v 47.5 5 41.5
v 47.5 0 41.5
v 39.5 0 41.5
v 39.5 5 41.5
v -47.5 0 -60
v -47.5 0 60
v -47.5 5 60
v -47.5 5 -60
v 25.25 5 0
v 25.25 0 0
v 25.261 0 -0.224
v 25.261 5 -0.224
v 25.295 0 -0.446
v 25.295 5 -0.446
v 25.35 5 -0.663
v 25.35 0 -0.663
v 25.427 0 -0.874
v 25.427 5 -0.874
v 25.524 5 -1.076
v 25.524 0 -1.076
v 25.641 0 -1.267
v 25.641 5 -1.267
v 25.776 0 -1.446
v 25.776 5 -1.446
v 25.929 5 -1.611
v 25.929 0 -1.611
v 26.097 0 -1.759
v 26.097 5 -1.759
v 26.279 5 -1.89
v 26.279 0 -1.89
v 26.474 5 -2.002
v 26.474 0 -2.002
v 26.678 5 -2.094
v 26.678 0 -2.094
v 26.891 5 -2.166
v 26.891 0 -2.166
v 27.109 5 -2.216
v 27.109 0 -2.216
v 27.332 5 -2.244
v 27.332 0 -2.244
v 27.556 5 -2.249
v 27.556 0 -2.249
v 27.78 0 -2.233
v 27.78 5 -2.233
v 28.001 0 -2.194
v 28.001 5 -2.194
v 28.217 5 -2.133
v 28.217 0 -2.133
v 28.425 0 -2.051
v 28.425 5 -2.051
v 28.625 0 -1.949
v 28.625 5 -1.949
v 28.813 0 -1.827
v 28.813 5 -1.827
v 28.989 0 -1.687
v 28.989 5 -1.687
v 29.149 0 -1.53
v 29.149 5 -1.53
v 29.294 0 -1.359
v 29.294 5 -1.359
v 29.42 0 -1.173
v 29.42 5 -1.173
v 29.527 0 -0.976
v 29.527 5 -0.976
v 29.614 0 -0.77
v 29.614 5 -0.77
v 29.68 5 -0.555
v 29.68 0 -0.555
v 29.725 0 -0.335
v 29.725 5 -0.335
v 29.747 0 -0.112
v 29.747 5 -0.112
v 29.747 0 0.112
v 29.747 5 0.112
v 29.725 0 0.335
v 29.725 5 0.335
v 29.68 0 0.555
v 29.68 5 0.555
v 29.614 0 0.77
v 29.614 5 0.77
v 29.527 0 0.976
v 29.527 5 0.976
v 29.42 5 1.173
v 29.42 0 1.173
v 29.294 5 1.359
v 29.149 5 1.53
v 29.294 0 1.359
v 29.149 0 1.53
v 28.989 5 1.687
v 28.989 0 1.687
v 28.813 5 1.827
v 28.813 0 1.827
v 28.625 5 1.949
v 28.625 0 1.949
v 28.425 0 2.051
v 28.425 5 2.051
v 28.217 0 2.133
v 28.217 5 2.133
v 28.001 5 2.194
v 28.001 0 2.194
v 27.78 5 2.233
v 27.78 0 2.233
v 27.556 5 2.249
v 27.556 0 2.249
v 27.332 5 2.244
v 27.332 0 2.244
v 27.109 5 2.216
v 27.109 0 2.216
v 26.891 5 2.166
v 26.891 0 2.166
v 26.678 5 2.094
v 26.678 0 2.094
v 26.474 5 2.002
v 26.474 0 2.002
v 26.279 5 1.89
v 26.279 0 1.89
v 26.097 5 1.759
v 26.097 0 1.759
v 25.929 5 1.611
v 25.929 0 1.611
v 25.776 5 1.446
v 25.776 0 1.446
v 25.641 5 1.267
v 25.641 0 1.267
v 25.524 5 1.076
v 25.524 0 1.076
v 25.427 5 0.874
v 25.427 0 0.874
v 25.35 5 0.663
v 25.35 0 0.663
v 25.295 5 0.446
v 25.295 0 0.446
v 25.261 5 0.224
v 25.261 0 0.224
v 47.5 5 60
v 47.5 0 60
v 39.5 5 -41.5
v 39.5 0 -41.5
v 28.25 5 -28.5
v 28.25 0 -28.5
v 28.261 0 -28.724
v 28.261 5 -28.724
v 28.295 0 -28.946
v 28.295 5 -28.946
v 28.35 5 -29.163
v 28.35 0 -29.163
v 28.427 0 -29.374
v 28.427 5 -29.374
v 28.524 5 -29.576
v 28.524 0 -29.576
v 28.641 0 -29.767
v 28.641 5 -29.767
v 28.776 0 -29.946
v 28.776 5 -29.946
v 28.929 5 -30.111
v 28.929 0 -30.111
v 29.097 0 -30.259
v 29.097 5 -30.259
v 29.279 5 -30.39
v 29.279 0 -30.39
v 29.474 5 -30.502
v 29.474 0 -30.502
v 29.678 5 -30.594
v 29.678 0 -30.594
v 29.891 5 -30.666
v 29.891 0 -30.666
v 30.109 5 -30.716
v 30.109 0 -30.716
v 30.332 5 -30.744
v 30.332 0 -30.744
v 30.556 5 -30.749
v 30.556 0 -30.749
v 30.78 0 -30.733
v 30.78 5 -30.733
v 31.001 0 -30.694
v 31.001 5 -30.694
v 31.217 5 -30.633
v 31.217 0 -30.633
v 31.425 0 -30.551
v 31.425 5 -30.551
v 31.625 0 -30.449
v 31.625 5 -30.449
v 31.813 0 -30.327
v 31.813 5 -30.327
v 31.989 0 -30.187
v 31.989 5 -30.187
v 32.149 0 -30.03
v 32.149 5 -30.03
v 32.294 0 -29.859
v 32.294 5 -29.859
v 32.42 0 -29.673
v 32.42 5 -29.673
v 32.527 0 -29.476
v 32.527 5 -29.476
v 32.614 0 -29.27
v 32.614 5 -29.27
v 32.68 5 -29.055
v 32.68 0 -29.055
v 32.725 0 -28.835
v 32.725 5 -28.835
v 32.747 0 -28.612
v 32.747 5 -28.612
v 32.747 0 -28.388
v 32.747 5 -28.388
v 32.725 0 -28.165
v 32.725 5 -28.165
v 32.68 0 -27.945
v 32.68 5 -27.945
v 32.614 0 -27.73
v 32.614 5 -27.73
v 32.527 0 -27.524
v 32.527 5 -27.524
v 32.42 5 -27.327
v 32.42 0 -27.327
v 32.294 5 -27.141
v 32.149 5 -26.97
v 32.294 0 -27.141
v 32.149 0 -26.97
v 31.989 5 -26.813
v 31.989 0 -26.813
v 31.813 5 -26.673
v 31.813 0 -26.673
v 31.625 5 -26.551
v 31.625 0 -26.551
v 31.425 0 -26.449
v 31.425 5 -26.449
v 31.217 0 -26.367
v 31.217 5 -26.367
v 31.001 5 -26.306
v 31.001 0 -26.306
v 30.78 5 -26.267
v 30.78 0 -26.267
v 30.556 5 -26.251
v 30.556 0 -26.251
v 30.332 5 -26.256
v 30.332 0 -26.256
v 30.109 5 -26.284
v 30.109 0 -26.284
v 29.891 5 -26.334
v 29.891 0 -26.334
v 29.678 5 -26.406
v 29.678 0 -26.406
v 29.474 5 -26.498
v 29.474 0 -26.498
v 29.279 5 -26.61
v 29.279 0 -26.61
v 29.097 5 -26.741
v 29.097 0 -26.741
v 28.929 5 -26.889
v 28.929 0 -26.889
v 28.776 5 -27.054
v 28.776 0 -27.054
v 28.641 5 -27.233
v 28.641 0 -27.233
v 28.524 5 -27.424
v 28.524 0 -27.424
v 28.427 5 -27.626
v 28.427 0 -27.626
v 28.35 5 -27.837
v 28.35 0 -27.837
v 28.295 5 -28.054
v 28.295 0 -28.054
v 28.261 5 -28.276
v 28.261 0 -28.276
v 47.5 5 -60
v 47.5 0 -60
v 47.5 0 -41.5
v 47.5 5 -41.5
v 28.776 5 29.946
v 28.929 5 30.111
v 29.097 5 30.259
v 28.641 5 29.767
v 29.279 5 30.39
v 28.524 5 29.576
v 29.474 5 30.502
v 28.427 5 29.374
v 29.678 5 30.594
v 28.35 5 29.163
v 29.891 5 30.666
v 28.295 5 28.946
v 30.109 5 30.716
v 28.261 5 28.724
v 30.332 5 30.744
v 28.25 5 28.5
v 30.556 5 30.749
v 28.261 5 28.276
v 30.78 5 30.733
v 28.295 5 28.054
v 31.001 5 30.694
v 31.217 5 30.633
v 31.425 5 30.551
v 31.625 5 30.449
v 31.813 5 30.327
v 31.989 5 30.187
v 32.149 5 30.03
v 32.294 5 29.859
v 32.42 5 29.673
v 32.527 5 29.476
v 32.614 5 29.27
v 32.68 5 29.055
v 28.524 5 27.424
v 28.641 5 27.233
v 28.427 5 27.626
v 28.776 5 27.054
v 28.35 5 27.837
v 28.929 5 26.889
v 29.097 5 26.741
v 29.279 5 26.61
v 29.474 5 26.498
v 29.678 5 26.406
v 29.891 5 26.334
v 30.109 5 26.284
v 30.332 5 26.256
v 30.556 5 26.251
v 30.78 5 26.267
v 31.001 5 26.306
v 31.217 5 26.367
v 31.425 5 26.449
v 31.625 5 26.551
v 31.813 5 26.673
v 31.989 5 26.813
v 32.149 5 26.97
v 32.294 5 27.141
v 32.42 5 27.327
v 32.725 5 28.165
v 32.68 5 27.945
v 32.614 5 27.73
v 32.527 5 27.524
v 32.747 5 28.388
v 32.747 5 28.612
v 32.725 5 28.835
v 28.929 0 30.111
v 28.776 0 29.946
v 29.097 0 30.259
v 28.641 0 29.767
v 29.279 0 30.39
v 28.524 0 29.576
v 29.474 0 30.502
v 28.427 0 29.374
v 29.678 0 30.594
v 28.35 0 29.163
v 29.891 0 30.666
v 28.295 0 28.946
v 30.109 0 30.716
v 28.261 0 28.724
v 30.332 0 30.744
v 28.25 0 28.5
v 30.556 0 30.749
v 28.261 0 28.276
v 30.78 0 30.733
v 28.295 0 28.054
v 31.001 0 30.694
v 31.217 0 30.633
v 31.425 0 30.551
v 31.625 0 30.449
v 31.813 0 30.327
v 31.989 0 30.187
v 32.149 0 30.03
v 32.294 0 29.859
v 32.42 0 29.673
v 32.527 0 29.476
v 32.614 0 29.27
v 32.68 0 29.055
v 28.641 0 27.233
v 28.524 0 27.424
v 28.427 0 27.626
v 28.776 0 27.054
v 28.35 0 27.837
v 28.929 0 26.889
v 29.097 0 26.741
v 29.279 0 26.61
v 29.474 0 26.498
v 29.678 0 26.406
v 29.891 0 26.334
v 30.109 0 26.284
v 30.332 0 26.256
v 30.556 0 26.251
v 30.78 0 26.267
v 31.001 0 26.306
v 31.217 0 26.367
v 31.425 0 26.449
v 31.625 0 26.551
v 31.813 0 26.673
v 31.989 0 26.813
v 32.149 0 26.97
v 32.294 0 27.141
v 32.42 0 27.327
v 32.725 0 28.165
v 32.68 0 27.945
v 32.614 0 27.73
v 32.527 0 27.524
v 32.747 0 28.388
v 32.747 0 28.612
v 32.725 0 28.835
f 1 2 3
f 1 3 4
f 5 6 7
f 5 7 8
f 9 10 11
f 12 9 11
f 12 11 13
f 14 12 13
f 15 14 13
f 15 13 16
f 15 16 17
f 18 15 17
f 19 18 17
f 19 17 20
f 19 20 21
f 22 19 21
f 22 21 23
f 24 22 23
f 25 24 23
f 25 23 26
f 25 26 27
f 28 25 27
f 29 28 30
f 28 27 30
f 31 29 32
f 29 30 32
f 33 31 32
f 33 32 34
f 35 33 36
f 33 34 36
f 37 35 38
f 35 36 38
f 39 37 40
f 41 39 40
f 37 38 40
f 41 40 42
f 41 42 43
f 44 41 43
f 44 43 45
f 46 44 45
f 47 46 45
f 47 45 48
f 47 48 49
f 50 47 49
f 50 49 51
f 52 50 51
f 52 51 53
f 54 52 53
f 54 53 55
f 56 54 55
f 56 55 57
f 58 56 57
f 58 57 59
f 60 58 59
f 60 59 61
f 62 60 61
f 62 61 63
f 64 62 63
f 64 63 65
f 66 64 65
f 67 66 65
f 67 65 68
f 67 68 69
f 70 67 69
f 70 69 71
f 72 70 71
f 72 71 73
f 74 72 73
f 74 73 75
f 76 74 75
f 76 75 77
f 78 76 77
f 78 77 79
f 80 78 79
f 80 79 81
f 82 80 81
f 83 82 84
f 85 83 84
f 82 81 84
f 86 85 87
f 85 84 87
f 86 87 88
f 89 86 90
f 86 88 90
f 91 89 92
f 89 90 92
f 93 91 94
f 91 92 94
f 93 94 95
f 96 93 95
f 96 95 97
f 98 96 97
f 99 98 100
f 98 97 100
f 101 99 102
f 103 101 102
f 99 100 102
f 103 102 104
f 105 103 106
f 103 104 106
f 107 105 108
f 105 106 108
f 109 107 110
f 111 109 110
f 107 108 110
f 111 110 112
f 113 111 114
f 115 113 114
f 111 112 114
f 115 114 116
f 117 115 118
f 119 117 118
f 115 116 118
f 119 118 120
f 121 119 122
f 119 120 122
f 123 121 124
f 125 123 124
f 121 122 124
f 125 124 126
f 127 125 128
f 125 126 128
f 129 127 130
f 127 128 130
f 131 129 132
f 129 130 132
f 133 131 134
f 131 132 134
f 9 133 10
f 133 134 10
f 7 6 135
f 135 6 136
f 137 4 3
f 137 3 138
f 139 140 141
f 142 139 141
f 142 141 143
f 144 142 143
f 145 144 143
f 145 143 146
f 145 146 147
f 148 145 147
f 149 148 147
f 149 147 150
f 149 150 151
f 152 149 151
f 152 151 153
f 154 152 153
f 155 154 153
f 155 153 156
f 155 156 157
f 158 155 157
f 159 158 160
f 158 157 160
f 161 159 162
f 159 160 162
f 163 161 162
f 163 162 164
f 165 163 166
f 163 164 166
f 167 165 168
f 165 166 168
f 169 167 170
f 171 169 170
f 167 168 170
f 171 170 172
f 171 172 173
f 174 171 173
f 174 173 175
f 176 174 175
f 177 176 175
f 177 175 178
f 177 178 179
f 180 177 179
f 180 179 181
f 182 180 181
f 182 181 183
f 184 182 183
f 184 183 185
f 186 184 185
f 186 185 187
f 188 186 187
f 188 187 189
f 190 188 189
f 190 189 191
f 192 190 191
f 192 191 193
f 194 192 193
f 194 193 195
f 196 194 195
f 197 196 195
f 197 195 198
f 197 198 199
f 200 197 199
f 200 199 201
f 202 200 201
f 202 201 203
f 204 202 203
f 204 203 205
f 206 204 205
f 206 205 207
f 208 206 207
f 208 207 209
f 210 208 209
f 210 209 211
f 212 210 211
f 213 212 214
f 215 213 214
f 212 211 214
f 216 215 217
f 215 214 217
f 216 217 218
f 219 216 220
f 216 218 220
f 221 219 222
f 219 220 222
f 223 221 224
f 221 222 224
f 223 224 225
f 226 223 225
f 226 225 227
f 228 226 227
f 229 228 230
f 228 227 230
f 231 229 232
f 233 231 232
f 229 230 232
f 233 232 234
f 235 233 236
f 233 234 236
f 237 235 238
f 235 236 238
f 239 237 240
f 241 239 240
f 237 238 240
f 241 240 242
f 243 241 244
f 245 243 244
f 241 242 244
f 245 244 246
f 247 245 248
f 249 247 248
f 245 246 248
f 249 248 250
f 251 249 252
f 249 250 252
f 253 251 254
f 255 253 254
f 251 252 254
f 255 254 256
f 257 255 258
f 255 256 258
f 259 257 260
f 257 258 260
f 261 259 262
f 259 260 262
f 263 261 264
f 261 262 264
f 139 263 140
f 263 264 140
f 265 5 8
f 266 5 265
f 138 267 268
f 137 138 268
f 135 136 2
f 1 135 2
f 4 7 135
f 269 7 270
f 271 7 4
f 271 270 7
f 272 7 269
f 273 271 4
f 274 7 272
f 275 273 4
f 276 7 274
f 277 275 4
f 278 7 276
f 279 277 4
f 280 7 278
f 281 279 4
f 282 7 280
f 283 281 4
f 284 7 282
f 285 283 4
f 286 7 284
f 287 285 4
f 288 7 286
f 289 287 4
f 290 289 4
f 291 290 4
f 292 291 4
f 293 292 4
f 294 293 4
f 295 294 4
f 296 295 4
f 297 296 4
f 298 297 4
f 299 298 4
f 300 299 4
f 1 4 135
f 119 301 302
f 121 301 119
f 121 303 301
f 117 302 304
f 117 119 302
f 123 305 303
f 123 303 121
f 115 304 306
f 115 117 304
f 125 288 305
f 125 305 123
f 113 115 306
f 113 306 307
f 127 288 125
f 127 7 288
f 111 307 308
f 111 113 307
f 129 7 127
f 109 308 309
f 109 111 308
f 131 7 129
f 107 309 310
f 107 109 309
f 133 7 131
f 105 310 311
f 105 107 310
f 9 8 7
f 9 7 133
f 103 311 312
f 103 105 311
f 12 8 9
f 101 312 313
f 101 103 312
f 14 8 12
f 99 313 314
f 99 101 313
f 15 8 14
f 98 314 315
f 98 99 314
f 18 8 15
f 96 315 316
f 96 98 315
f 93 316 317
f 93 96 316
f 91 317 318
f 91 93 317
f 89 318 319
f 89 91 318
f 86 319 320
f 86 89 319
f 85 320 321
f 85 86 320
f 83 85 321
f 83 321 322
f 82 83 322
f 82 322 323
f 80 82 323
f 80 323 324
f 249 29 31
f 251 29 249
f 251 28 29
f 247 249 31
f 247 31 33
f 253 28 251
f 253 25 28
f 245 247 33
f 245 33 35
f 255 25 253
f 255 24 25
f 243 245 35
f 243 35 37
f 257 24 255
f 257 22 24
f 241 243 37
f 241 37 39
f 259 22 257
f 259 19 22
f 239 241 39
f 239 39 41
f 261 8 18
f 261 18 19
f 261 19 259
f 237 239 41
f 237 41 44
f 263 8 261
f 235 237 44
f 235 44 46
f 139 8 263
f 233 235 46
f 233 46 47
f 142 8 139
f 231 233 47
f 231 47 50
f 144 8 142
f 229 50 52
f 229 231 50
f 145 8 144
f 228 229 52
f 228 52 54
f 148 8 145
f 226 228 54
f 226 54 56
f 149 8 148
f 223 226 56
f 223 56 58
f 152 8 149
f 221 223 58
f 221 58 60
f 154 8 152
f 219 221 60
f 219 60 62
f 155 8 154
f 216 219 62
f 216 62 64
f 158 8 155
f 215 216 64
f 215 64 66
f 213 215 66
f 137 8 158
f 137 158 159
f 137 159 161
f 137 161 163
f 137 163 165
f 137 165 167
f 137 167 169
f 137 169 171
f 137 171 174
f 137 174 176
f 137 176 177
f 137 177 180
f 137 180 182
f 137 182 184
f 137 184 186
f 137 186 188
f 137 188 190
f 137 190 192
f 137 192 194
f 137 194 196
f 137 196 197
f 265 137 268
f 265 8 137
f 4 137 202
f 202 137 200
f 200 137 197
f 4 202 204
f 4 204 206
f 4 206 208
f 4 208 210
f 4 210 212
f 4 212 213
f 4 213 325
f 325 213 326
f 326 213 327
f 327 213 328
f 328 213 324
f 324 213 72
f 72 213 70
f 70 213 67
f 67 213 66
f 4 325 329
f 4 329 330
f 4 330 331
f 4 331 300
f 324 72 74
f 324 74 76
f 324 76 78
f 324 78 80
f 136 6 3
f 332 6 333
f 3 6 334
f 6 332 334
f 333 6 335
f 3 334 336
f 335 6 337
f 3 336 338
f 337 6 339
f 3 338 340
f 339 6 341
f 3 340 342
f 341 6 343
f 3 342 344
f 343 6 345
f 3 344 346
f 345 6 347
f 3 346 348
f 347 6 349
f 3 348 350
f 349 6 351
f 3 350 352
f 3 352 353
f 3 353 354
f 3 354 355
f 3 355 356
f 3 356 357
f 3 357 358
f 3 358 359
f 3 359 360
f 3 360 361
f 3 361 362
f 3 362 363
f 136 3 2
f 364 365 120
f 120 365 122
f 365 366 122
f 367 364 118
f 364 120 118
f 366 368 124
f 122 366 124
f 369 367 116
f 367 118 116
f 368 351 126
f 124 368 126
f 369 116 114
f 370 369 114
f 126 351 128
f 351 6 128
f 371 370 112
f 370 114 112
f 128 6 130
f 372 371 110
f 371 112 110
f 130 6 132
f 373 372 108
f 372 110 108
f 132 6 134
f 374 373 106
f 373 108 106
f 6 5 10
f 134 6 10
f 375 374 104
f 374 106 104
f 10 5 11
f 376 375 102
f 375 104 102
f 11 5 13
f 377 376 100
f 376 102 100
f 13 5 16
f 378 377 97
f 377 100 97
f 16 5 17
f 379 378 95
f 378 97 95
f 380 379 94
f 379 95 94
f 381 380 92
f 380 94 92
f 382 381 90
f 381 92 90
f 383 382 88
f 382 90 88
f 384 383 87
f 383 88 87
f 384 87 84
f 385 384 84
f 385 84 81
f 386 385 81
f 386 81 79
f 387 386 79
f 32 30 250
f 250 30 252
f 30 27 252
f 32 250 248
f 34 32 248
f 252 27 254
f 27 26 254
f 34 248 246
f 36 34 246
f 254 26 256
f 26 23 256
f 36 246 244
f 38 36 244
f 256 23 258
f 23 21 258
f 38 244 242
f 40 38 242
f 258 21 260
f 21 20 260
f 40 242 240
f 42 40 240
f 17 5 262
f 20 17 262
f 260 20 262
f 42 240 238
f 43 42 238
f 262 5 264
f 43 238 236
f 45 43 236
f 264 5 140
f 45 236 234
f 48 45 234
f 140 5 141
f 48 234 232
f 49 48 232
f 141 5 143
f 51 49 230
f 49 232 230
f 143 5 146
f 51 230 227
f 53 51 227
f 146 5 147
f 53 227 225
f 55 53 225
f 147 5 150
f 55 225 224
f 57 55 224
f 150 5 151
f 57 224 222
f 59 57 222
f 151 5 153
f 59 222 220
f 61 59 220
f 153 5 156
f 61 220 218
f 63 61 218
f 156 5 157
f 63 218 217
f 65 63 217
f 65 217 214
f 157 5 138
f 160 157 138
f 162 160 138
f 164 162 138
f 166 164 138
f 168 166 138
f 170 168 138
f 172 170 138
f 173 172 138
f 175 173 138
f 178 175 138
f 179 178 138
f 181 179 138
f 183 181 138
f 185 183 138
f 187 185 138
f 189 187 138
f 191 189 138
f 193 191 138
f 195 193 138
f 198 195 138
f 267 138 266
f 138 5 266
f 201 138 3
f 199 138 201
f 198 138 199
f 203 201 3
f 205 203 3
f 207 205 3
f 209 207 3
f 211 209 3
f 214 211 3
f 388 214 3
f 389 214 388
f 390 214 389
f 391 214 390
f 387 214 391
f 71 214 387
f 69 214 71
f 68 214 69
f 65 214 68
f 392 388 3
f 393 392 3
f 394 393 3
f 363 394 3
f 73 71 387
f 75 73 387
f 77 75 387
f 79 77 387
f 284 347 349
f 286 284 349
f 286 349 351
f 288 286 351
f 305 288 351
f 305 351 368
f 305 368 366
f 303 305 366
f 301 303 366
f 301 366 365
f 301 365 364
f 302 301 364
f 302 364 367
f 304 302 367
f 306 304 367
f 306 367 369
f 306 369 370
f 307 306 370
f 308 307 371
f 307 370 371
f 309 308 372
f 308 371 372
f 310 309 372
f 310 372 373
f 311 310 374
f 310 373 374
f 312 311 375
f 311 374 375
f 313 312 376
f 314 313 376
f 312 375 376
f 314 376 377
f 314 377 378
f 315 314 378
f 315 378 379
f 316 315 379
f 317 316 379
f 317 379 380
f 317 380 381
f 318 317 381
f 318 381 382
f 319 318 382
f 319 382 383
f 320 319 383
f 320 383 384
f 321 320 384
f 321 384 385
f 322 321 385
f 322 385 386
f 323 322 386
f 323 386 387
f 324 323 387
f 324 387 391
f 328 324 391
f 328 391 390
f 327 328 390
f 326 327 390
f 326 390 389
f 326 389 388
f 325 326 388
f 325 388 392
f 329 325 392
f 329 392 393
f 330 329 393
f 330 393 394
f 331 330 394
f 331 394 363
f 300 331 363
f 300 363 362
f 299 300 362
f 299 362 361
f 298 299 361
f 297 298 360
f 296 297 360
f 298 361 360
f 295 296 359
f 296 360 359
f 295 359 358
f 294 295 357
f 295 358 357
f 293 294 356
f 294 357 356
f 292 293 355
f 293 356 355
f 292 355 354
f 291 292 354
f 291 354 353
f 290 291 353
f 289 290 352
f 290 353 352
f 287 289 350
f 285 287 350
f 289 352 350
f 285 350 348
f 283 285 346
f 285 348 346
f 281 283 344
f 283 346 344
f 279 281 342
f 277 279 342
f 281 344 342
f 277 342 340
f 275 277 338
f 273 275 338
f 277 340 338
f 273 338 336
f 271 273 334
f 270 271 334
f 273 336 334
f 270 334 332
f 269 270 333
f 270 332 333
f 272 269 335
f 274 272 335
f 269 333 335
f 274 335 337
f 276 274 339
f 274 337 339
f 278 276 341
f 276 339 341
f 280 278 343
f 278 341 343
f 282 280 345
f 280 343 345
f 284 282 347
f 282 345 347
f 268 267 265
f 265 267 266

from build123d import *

# Parameters (mm, degrees)
SKETCH1_W                  = 95
SKETCH1_H                  = 120
BOSS_EXTRUDE1_DEPTH        = 5
SKETCH2_W                  = 83
SKETCH2_H                  = 5
CUT_EXTRUDE1_DEPTH         = 8
F_4_5_4_5_DIAMETER_HOLE1_D = 4.5


with BuildPart() as part:
    # Sketch1 → Boss-Extrude1 (new body)
    with BuildSketch(Plane(origin=(0, 0, 0), x_dir=(1, 0, 0), z_dir=(0, 1, 0))):
        Rectangle(SKETCH1_W, SKETCH1_H)
    extrude(amount=BOSS_EXTRUDE1_DEPTH)

    # Sketch2 → Cut-Extrude1 (cut)
    with BuildSketch(Plane(origin=(47.5, 0, 0), x_dir=(0, 0, -1), z_dir=(1, 0, 0))):
        with Locations((0, 2.5)):
            Rectangle(SKETCH2_W, SKETCH2_H)
    extrude(amount=-CUT_EXTRUDE1_DEPTH, mode=Mode.SUBTRACT)

    # Ø4.5 (4.5) Diameter Hole1 (through all)
    with Locations(Plane(origin=(0, 5, 0), x_dir=(1, 0, 0), z_dir=(0, 1, 0))):
        with Locations((30.5, 28.5), (27.5, 0), (30.5, -28.5)):
            Hole(F_4_5_4_5_DIAMETER_HOLE1_D / 2)


solid = part.part
